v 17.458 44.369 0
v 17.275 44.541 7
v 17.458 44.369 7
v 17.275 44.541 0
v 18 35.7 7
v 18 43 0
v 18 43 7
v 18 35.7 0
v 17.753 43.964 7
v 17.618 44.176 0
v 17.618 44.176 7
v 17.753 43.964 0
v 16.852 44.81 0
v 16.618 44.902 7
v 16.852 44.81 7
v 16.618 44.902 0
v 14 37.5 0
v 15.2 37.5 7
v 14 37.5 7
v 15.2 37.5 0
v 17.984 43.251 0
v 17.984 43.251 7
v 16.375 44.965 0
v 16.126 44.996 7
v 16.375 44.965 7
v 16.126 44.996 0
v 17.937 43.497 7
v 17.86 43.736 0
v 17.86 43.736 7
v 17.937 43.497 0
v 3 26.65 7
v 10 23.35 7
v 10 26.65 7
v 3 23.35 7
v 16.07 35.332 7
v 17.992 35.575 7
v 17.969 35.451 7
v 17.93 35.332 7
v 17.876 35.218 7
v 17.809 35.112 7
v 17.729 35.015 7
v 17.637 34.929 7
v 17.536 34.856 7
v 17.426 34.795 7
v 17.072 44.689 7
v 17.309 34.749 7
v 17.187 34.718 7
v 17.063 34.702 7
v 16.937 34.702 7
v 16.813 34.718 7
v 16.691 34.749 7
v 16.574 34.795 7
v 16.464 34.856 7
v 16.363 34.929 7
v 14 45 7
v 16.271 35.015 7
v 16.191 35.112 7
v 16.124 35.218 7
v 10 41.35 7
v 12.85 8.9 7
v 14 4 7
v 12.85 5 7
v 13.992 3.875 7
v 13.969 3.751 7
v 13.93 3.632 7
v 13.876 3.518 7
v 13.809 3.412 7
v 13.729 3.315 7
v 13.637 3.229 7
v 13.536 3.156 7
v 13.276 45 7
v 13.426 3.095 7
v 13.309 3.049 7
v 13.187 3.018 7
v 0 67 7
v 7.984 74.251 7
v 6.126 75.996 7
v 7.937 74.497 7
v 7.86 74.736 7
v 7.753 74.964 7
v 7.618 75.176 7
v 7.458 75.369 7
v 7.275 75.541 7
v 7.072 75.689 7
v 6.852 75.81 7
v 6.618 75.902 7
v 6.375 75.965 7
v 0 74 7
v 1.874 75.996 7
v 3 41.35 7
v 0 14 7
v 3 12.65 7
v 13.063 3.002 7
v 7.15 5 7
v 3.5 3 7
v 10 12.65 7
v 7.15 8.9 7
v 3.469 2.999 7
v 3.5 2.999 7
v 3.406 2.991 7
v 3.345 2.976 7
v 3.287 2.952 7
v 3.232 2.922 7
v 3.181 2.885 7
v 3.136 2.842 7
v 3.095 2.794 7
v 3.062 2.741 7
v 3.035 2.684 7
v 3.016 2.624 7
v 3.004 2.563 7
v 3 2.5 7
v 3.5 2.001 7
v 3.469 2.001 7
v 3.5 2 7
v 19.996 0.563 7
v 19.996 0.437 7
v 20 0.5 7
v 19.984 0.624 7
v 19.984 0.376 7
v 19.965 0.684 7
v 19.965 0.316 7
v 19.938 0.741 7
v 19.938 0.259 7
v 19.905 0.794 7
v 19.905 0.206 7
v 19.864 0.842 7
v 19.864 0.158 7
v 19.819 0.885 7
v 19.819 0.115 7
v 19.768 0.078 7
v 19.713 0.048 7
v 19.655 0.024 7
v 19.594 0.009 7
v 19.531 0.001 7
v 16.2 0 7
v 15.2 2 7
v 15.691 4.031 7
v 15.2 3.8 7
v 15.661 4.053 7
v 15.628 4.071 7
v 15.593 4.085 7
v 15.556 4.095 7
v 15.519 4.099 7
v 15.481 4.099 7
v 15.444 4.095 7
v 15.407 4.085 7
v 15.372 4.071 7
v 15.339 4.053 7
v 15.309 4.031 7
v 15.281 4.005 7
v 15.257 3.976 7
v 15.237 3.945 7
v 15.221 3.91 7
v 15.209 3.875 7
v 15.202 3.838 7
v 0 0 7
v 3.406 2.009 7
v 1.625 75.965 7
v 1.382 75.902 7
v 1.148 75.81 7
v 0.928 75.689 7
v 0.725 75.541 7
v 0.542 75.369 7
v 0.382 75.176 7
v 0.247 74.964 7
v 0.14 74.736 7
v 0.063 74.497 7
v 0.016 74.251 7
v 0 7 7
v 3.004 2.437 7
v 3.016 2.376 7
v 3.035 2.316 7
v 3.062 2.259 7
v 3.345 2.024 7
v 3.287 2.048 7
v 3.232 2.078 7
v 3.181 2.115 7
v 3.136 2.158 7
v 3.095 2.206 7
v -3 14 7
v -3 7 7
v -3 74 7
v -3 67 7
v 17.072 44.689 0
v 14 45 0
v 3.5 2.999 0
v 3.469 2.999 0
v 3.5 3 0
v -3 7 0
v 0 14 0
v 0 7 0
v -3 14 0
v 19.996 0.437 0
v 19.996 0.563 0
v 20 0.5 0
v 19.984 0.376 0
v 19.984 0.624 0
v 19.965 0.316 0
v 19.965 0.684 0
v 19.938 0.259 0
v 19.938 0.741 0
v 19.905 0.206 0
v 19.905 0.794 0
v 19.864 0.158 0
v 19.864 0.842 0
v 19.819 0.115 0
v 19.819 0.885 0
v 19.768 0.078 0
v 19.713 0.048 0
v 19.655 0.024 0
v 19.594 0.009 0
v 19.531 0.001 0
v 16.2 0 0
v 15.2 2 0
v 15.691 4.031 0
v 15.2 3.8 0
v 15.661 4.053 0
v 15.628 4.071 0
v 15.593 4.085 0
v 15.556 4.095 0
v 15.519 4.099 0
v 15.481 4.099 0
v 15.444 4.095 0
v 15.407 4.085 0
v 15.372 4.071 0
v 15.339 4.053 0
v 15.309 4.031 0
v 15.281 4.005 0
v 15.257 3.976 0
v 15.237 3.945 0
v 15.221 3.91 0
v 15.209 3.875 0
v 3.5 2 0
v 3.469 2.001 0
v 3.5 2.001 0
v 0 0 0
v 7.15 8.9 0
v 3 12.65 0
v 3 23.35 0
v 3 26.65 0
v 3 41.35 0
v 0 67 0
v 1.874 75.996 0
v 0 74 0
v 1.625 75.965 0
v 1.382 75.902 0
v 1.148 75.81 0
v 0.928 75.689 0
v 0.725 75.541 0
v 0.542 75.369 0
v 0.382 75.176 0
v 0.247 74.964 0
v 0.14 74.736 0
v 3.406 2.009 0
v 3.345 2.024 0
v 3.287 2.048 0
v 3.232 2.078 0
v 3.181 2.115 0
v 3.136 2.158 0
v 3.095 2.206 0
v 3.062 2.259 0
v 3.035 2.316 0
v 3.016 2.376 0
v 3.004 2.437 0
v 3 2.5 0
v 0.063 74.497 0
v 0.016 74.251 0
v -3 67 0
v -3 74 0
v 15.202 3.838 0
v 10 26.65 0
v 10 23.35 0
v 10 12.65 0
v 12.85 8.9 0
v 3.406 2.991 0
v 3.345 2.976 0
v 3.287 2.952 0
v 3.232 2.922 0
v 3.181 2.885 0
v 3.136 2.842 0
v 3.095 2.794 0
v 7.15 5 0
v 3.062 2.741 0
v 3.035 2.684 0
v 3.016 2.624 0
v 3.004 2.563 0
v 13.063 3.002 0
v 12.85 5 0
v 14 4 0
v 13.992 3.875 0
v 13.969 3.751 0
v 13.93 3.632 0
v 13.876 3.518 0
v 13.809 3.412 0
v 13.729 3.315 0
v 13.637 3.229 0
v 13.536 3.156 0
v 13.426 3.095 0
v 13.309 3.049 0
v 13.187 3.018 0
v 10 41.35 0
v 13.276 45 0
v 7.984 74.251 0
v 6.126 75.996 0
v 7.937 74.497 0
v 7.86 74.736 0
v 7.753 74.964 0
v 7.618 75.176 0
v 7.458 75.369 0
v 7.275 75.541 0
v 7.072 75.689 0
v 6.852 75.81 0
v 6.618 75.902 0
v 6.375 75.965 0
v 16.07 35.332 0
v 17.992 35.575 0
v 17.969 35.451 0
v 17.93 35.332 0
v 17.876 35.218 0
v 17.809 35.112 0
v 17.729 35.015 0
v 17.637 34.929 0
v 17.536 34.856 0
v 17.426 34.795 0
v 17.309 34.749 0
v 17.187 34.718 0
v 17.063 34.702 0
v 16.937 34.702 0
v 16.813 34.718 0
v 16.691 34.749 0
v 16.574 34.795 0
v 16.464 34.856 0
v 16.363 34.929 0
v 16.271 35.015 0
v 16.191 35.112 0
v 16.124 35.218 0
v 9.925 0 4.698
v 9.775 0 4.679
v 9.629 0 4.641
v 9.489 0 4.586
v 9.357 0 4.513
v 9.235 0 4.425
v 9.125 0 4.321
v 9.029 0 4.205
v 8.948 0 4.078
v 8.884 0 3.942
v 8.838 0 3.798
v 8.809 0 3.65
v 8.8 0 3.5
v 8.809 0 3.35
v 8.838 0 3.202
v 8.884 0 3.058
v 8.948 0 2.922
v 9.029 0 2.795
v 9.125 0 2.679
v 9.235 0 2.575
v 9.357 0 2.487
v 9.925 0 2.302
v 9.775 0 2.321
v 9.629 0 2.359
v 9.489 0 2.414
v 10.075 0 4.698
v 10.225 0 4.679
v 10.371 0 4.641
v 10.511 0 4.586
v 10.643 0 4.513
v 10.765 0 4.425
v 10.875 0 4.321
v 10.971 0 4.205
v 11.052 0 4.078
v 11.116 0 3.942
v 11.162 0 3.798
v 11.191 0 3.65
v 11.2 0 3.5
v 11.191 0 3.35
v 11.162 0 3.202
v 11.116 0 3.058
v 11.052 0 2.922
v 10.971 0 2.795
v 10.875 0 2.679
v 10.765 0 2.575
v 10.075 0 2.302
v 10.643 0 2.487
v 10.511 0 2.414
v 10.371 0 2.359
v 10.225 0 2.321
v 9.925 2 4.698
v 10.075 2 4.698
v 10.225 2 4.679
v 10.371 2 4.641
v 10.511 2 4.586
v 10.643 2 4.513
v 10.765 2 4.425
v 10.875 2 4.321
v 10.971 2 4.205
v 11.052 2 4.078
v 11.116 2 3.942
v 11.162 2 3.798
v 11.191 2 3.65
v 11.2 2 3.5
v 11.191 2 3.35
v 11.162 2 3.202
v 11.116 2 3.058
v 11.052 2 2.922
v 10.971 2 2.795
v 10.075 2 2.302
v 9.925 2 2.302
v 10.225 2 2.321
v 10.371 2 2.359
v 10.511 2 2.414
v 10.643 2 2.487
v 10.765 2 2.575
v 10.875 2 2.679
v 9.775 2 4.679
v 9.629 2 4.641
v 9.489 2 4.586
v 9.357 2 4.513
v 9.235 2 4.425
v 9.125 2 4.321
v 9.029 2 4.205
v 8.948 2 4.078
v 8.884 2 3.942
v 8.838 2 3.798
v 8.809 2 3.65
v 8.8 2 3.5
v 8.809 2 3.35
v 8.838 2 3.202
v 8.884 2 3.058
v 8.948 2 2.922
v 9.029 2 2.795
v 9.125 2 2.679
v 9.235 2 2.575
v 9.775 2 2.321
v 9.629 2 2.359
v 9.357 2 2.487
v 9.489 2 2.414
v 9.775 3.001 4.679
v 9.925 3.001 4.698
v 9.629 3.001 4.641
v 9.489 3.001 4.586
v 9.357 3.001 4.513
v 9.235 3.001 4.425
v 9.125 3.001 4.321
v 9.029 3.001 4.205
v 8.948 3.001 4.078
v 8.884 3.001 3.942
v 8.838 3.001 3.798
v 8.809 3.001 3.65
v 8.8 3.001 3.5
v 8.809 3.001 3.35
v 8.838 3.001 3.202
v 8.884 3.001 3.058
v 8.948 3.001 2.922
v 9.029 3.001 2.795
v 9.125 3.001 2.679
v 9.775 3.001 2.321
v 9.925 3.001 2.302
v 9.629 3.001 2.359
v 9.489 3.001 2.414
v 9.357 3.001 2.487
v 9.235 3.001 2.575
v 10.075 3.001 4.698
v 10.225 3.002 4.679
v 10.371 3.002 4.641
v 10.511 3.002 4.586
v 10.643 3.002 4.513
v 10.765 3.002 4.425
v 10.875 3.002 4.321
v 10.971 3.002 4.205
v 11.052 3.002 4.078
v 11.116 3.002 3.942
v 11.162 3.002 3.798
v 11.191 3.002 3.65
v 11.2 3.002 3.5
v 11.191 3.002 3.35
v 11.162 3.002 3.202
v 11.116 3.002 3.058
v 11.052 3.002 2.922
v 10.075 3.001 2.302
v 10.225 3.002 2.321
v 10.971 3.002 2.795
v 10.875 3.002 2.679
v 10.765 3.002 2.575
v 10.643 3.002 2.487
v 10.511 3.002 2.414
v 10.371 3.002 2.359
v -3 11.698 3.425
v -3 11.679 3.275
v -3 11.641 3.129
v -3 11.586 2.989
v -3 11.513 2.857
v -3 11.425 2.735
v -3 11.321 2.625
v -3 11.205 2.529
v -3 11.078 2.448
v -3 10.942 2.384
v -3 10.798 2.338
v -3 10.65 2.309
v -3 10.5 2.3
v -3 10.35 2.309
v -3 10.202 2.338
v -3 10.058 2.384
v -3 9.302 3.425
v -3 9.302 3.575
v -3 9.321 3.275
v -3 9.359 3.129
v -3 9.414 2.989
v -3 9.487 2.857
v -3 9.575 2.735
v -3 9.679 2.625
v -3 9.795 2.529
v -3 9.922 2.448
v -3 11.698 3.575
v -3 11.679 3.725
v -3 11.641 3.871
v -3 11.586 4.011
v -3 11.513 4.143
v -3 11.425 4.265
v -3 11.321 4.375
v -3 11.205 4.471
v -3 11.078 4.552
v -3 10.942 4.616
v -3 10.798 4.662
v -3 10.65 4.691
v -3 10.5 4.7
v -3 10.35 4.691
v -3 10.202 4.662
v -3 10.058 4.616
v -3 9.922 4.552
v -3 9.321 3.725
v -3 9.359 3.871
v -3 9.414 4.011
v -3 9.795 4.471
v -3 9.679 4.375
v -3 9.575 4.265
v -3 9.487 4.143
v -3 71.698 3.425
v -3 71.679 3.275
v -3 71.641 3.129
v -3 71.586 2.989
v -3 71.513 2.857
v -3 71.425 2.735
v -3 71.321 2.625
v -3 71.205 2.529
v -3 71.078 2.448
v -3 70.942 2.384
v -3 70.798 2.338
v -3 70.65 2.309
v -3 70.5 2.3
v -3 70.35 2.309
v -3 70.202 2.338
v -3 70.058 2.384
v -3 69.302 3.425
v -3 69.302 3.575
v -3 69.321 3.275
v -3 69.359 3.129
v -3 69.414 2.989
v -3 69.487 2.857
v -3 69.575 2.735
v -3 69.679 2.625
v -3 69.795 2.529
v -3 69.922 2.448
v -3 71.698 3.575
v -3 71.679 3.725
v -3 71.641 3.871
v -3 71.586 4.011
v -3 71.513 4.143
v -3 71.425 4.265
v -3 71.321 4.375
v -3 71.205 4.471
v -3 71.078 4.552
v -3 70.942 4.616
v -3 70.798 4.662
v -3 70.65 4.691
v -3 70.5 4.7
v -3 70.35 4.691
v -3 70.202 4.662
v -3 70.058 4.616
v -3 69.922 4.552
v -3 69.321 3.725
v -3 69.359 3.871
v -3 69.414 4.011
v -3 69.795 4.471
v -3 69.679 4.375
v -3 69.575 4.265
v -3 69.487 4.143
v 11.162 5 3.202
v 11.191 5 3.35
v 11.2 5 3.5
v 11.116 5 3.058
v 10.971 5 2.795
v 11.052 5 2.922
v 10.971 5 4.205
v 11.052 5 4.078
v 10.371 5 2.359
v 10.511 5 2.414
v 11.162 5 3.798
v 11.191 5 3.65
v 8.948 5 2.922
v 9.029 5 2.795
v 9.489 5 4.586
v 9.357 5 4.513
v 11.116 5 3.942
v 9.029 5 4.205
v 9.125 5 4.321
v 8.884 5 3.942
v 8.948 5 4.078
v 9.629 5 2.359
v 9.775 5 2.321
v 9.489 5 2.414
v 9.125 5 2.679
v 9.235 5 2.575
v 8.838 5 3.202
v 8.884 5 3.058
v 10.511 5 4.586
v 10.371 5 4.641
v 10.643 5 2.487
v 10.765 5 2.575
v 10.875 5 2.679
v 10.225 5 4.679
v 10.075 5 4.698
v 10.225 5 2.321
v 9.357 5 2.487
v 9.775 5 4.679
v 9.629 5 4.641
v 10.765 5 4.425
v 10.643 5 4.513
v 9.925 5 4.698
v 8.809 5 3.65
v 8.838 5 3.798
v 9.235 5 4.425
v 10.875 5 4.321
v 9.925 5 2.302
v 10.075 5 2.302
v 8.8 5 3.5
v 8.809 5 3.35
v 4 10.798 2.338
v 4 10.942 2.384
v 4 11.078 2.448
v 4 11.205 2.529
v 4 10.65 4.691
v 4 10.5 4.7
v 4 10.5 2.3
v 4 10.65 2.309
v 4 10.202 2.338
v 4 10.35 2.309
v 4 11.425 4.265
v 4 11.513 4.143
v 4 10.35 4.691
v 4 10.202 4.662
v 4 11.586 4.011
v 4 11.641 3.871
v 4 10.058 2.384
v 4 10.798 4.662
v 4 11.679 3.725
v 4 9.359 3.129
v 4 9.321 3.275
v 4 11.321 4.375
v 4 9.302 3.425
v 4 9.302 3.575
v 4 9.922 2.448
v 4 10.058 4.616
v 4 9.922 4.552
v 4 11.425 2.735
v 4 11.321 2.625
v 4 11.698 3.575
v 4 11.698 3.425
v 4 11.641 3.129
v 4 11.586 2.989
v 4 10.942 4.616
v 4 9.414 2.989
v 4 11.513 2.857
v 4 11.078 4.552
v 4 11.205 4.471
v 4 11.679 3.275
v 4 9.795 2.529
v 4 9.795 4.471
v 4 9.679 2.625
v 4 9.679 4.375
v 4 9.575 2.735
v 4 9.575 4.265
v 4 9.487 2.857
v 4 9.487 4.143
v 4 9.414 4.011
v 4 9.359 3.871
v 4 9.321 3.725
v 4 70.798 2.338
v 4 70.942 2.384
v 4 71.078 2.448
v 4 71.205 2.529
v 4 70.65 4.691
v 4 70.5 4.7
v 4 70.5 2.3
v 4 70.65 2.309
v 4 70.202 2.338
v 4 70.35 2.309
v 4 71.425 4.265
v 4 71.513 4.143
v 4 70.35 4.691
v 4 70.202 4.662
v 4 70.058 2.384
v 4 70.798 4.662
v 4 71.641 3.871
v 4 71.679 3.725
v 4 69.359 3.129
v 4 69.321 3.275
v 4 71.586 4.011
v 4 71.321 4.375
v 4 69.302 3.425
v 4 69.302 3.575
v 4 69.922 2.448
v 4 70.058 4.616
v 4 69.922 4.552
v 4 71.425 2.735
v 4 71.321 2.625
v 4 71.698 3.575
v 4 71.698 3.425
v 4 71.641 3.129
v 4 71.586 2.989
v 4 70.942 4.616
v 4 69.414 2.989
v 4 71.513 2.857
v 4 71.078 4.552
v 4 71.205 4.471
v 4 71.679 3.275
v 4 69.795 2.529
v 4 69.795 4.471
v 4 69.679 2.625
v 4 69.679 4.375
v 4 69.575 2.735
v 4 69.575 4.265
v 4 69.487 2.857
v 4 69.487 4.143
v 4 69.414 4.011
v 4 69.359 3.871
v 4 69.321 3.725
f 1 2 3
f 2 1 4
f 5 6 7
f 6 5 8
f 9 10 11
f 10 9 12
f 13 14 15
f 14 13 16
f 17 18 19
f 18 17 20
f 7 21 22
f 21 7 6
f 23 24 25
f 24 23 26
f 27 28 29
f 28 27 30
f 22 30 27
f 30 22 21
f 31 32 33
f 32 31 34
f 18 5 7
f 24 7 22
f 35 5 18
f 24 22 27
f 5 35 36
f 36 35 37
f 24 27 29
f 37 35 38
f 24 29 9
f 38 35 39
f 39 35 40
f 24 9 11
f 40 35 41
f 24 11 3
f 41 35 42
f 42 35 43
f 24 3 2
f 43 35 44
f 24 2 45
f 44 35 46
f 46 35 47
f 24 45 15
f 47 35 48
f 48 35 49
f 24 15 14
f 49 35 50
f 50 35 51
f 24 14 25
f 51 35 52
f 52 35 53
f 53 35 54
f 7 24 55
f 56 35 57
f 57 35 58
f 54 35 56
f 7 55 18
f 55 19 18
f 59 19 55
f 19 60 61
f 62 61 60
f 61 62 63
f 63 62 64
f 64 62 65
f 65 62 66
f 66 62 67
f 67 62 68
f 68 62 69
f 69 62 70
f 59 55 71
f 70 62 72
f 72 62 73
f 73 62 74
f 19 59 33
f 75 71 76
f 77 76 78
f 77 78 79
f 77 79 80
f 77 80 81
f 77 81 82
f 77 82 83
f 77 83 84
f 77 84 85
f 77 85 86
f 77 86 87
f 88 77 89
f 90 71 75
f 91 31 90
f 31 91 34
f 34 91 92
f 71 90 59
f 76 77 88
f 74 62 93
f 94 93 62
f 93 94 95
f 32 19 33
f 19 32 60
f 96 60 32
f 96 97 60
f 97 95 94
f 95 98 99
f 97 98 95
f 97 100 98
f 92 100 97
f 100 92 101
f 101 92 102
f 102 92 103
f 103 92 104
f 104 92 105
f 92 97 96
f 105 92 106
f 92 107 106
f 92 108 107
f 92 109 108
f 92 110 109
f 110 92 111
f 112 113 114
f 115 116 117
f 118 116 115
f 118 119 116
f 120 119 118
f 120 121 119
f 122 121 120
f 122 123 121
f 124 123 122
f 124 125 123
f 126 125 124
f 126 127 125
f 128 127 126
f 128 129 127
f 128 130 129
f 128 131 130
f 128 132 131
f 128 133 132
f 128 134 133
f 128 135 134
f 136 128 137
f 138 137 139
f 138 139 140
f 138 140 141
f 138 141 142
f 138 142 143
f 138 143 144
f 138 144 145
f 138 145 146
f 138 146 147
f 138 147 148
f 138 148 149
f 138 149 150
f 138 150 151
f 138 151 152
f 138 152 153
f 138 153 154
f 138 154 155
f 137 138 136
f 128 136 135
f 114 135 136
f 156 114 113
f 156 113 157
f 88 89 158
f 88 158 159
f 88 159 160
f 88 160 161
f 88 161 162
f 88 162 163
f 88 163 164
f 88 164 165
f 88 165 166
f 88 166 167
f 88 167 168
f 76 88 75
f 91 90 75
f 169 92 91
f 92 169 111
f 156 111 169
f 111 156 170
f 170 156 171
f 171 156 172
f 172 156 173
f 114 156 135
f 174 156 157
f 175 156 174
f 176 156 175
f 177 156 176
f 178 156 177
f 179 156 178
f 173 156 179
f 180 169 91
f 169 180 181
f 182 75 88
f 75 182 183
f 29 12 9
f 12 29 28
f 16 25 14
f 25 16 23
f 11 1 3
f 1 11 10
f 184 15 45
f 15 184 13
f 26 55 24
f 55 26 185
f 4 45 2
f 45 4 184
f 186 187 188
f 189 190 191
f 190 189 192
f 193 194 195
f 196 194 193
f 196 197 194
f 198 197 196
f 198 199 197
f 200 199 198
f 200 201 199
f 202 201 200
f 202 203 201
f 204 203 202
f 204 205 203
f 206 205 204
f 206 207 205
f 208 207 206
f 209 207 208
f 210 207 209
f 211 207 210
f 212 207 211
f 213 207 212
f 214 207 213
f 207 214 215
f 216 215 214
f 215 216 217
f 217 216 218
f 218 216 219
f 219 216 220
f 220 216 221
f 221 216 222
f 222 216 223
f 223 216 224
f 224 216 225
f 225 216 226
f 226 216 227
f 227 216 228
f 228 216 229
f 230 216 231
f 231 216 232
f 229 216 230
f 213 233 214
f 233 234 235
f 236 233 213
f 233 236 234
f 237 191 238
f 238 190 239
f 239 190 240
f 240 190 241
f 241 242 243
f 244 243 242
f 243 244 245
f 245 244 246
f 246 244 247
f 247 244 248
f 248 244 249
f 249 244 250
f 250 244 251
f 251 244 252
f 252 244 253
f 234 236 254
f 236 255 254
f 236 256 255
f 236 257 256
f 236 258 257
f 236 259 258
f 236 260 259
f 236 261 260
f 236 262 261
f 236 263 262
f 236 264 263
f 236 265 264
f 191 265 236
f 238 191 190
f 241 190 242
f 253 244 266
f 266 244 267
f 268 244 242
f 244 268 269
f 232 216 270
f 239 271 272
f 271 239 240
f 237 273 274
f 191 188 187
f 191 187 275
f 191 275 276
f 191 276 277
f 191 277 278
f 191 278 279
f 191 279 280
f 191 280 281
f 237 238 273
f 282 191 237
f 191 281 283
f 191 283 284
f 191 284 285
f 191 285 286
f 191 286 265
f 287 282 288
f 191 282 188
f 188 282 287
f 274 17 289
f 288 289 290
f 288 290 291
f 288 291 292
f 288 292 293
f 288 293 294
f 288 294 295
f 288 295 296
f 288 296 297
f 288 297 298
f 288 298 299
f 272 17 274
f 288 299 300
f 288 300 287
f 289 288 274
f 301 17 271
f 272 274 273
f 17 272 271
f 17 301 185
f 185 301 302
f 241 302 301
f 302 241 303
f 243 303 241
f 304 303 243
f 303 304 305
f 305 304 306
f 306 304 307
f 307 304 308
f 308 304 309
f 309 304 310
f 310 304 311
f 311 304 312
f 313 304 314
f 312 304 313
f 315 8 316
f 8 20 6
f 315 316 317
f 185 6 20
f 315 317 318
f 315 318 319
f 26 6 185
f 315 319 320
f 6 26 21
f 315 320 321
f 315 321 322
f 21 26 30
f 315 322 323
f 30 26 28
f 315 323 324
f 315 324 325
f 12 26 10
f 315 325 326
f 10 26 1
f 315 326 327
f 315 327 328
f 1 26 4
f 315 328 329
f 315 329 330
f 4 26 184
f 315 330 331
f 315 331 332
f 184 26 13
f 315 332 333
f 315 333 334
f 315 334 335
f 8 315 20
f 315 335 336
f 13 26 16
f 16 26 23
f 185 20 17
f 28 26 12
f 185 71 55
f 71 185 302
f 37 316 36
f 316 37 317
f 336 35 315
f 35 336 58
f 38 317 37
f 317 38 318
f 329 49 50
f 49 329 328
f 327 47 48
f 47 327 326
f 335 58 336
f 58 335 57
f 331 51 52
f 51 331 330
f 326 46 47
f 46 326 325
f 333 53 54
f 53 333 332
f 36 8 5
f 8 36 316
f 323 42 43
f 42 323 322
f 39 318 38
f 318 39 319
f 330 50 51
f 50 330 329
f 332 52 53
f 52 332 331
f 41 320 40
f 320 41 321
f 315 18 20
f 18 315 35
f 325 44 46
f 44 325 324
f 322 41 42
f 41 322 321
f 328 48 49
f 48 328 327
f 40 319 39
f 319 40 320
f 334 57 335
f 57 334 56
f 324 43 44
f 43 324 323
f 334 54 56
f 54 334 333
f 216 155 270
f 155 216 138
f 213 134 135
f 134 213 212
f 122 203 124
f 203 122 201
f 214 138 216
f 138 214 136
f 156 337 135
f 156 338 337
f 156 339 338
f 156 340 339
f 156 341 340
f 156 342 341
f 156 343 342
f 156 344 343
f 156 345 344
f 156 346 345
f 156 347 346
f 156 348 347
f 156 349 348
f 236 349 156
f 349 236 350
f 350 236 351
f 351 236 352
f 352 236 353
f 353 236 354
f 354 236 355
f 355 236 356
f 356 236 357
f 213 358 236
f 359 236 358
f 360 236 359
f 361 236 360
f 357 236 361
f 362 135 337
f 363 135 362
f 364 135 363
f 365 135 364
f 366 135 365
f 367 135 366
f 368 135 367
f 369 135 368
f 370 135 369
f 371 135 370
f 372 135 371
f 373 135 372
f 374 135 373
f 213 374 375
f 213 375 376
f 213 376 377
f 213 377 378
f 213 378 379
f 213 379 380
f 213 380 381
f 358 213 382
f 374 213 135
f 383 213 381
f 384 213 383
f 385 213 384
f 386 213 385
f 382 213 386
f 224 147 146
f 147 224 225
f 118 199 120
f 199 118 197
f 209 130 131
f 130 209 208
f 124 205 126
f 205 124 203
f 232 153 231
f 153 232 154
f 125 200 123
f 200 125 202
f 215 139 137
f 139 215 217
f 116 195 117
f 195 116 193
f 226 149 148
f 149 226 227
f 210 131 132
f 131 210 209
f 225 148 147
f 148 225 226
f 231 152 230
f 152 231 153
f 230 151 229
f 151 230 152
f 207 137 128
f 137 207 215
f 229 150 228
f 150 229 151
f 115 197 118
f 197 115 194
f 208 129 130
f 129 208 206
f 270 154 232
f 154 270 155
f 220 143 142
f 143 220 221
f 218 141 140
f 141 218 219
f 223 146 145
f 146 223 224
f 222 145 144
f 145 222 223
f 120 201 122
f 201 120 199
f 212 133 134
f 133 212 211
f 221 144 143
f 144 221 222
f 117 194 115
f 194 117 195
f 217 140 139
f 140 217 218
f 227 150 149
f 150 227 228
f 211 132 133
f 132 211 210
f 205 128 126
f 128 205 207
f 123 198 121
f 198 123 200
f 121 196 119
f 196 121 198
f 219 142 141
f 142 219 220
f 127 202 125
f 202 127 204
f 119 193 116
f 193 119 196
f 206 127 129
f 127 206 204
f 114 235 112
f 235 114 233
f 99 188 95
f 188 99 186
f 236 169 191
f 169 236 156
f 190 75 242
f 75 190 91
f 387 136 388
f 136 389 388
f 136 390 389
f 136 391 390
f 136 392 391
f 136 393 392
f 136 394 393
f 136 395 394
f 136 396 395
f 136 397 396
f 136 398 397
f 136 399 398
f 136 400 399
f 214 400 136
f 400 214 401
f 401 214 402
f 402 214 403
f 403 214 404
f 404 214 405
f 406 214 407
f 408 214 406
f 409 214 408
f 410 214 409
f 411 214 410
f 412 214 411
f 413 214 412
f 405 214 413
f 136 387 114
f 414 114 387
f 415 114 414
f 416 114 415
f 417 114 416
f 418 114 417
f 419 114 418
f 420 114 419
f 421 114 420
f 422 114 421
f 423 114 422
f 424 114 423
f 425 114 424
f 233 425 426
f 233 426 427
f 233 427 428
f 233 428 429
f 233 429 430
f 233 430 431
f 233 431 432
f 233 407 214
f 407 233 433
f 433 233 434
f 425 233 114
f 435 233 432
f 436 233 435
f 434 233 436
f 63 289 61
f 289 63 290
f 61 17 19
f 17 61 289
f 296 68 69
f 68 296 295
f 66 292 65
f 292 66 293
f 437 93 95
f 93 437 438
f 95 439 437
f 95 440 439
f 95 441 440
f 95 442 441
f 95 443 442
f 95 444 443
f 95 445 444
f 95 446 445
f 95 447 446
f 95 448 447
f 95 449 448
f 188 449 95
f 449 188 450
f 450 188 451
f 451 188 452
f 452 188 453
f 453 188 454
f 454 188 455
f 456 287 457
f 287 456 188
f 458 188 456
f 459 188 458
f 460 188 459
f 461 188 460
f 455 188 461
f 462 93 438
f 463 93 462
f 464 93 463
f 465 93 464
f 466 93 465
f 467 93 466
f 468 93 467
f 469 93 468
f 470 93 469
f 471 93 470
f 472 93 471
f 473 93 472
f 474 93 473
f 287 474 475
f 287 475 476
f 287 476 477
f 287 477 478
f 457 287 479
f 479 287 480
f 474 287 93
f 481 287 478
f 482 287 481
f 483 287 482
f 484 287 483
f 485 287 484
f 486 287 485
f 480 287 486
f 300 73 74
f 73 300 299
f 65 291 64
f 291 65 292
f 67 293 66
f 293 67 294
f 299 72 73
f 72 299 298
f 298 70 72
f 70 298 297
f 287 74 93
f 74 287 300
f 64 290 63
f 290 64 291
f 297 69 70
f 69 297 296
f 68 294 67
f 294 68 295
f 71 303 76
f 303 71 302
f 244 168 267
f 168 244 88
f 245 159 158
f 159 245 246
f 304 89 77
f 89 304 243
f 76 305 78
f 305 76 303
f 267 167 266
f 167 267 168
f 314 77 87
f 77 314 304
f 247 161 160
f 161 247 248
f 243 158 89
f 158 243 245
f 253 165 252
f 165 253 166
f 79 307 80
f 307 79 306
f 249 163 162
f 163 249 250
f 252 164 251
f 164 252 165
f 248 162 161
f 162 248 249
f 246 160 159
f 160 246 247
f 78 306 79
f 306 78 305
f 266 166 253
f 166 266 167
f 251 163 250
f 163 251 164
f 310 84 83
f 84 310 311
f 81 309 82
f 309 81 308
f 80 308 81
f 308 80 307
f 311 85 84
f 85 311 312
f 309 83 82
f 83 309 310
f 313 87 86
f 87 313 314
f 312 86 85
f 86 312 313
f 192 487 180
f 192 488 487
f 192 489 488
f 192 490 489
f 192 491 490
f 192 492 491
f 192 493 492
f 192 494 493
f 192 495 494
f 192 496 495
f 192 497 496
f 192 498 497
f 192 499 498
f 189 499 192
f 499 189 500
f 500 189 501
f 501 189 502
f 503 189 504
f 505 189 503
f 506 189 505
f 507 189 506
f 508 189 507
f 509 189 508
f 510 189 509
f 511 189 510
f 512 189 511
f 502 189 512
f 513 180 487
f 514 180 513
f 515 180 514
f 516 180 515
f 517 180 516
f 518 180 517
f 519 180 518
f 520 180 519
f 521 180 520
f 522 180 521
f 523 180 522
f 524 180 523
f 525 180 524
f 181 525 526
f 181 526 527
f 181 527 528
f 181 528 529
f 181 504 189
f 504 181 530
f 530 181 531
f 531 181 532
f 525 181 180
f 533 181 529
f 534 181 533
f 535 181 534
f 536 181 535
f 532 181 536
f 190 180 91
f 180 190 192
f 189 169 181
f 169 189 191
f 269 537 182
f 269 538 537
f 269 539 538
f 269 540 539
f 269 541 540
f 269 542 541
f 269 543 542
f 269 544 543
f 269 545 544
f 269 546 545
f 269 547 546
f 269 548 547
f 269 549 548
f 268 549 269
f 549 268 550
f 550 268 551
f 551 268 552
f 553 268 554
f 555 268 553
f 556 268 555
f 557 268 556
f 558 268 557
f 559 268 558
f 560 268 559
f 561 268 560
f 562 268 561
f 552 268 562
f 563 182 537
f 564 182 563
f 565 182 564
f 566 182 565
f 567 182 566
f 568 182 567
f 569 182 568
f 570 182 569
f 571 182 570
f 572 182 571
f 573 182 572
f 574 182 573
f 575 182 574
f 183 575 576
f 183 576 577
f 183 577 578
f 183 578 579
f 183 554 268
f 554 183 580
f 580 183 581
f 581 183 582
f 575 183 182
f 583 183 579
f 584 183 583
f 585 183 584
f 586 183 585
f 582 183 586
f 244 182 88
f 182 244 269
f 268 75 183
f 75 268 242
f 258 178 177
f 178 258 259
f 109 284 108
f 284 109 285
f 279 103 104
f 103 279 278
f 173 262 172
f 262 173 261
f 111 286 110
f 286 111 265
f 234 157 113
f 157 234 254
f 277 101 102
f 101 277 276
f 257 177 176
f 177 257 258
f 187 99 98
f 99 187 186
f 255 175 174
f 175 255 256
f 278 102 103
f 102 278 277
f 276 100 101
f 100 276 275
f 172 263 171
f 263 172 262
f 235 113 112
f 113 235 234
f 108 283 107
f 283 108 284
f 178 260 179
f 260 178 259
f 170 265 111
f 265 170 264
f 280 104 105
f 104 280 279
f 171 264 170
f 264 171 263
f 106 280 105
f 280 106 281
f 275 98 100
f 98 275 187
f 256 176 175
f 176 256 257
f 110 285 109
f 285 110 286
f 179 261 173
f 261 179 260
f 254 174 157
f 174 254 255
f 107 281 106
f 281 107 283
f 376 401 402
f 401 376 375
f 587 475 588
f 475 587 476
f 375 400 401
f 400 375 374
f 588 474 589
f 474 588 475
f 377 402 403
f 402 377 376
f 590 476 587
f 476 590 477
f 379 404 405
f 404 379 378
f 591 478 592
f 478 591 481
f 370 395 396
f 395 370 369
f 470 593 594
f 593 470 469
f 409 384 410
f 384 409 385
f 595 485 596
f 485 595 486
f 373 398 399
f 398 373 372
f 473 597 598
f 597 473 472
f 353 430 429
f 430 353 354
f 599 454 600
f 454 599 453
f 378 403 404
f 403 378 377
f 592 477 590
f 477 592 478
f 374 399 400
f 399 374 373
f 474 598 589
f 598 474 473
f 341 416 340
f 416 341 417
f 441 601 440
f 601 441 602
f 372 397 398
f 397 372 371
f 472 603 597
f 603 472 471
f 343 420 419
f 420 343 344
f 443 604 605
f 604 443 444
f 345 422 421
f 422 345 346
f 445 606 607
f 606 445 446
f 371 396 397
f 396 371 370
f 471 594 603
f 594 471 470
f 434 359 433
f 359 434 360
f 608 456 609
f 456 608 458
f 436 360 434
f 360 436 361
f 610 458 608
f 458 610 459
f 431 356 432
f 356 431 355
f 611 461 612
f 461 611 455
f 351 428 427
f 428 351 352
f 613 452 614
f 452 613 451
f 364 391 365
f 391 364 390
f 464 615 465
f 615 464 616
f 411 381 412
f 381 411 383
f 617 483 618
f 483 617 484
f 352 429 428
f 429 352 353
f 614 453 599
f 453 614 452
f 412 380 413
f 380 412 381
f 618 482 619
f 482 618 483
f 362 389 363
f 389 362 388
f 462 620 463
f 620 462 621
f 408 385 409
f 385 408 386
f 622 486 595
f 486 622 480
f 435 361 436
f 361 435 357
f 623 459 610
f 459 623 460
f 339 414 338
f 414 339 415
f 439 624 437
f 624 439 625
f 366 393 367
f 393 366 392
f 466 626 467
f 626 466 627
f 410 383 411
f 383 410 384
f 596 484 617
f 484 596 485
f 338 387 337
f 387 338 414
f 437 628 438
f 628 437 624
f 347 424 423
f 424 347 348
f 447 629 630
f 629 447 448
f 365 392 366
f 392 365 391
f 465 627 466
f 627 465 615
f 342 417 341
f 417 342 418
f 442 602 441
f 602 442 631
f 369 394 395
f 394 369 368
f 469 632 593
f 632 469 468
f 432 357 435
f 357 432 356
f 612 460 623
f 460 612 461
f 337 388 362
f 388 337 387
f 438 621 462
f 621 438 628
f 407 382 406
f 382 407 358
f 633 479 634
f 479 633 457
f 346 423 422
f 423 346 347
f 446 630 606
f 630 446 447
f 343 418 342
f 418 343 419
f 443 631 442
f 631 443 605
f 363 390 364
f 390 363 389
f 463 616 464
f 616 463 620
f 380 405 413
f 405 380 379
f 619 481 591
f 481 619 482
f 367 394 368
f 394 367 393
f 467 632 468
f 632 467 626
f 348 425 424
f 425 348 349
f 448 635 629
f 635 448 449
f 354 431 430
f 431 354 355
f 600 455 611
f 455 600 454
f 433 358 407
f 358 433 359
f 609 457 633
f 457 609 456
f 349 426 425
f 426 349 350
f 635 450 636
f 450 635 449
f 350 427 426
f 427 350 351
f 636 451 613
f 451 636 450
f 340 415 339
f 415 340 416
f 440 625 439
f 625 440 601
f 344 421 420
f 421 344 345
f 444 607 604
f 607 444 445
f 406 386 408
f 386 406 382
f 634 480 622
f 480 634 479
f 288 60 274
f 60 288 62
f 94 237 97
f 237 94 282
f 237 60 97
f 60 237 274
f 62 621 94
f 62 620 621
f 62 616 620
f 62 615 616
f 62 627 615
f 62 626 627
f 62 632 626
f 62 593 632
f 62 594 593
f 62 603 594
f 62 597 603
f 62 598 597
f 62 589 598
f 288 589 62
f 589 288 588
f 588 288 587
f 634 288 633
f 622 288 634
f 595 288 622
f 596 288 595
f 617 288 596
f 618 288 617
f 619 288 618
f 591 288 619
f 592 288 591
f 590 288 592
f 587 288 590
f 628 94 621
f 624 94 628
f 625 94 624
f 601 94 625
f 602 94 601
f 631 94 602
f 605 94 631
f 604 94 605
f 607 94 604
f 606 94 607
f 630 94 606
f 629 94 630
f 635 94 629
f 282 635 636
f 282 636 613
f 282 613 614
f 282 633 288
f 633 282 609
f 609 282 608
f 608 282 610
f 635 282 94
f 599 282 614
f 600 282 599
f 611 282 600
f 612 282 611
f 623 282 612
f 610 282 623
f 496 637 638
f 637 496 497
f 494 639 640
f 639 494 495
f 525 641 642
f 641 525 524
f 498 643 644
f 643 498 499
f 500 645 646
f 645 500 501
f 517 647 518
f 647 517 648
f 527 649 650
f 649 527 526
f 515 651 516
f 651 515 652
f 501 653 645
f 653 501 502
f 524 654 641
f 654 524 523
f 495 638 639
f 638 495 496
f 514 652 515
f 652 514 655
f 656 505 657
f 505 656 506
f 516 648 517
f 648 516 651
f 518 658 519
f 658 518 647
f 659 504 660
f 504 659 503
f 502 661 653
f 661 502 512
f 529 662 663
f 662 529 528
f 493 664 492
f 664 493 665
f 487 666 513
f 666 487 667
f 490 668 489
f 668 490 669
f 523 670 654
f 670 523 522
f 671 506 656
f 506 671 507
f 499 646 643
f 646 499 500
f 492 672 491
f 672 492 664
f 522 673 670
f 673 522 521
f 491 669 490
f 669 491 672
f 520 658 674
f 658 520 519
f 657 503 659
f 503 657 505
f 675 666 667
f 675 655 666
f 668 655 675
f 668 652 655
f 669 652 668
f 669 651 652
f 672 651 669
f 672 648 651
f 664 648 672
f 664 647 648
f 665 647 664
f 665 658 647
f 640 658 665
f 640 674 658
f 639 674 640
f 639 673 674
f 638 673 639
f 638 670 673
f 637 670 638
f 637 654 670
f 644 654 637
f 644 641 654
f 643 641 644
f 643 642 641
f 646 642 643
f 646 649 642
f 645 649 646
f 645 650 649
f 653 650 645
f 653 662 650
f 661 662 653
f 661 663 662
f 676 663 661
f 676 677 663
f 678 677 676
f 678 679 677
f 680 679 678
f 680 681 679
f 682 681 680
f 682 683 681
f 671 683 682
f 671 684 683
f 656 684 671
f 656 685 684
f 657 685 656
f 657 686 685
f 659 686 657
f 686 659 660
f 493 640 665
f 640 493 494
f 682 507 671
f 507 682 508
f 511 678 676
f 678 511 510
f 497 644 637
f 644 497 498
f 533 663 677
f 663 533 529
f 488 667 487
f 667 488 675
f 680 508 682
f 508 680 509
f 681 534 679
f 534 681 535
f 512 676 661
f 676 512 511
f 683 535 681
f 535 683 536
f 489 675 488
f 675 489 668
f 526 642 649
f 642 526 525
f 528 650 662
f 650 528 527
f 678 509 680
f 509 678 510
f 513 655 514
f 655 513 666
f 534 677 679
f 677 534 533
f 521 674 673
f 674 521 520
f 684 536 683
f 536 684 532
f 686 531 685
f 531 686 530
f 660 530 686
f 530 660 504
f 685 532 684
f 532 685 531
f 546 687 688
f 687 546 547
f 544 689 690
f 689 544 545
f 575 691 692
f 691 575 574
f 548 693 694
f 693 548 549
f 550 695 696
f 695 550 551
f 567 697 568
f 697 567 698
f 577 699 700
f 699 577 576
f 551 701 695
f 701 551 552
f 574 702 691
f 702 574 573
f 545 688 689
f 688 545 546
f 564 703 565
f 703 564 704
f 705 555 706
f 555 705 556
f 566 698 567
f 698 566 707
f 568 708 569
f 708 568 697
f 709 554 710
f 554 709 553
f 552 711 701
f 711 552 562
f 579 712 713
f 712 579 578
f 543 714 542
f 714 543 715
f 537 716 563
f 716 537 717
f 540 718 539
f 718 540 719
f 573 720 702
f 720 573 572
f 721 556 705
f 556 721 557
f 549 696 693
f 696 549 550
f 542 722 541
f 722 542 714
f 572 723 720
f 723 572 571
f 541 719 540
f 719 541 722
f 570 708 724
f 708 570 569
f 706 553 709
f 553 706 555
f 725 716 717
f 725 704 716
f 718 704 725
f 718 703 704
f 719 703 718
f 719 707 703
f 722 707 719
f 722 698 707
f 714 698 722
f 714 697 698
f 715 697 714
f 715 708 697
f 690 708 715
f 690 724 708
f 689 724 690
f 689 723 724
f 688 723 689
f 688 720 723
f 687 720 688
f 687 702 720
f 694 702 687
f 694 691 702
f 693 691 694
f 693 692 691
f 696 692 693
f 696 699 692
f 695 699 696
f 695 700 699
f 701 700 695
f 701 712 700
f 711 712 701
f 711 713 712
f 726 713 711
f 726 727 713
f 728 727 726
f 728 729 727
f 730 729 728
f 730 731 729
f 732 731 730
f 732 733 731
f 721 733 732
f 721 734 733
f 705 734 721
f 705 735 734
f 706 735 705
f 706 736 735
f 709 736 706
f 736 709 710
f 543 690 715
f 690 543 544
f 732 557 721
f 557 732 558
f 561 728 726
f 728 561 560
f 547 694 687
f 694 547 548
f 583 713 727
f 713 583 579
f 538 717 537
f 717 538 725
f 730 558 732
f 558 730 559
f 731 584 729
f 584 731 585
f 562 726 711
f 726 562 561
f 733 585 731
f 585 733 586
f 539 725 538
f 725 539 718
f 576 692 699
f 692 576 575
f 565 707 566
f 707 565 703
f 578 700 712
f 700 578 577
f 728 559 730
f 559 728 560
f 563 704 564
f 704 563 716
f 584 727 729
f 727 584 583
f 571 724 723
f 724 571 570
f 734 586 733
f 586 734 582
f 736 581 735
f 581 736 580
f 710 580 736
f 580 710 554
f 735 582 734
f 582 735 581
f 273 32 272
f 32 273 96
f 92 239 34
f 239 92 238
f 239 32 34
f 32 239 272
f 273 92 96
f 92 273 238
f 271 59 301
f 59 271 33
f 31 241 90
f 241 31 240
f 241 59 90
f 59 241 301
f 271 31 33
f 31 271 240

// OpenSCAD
//-------------------------------------------------------------------
// title: DIN clip
// author: OK1HRA 
// license: Creative Commons BY-SA
// URL: http://remoteqth.com/3d-din-rail-mount-clip.php
// revision: 0.1
// format: OpenSCAD
//-------------------------------------------------------------------
// HowTo:
// After open change inputs parameters and press F5
// .STL export press F6 and menu /Design/Export as STL...
//----------------- Input parameter ---------------------------------


distance = 60.0;   // Second mount screw distance
identation = 3;
$fn=50;
width = 7; 
screw = 1.20;      // radius
expand = 1;      // 0-x
long = 45;

din();

module din(){
	difference() {
		union() {
			hull() {
				translate([15+expand,long-2,0]) {cylinder(h=width, r=2, center=false);}
                translate([12+expand,37.5,0]) {cube([5,1,width], center=false);}
                translate([12+expand,long-1,0]) {cube([1,1,width], center=false);}
            }
			hull() {
				translate([16+expand,35.7,0]) {cylinder(h=width, r=1, center=false);}
                translate([14.2+expand,37.5,0]) {cube([2.8,1,width], center=false);}
            }
			hull() {
				translate([18.5+expand,0.5,0]) {cylinder(h=width, r=0.5, center=false);}
				translate([14.5+expand,3.8,0]) {cylinder(h=width, r=0.3, center=false);}
				translate([14.2+expand,0,0]) {cube([1,1,width], center=false);}
			}
			cube([3.5,4,width], center=false);
            cube([15+expand,2,width], center=false);
			hull() {
				translate([12+expand,4,0]) {cylinder(h=width, r=1, center=false);}
                translate([0,3,0]) {cube([1,1,width], center=false);}
                translate([0,long-1,0]) {cube([13+expand,1,width], center=false);}
            }
			hull() {
                translate([0,40,0]) {cube([14,1,width], center=false);}
                translate([2,distance+14,0]) {cylinder(h=width, r=2, center=false);}
                translate([6,distance+14,0]) {cylinder(h=width, r=2, center=false);}
            }
            translate([-identation,10.5-3.5,0]) {cube([identation+1,7,width], center=false);}
            translate([-identation,10.5-3.5+distance,0]) {cube([identation+1,7,width], center=false);}
        }
        translate([3.5,2.5,-1]) {cylinder(h=width+2, r=0.5, center=false);}
        
        // aretation
        translate([9+expand,-1,width/2]) rotate([-90,0,0]) {
            cylinder(h=7, r=screw, center=false);
        }
        translate([6.15+expand,5,-1]) {cube([5.7,3.9,width+2], center=false);}
        
        // 1. Primeiro Furo para montar o parafuso
        translate([-1-identation,10.5,width/2]) rotate([0,90,0]) {
            cylinder(h=4+expand+identation, r=screw, center=false);
        }
		// translate([3,7.65,-1]) {cube([1.9,5.7,width+2], center=false);}
        
        // 2. mount
        translate([-1-identation,10.5+distance,width/2]) rotate([0,90,0]) {
            cylinder(h=4+expand+identation, r=screw, center=false);
        }
        // translate([3,7.65+distance,-1]) {cube([1.9,5.7,width+2], center=false);}
        
        // 3. Vazio no meio da peça para econimizar plastico
        translate([3,12.65,-1]) {cube([7.0,10.7,width+2], center=false);}
        translate([3,26.65,-1]) {cube([7.0,14.7,width+2], center=false);}
        /*translate([3,44.65,-1]) {cube([5.9,10.7,width+2], center=false);}
        translate([3,58.65,-1]) {cube([4.8,11.0,width+2], center=false);}
        translate([3,72.65,-1]) {cube([4.0,11.0,width+2], center=false);}
        translate([3,86.65,-1]) {cube([3.5,11.0,width+2], center=false);}
        translate([3,100.65,-1]) {cube([3.0,17.0,width+2], center=false);}*/

    }
}
